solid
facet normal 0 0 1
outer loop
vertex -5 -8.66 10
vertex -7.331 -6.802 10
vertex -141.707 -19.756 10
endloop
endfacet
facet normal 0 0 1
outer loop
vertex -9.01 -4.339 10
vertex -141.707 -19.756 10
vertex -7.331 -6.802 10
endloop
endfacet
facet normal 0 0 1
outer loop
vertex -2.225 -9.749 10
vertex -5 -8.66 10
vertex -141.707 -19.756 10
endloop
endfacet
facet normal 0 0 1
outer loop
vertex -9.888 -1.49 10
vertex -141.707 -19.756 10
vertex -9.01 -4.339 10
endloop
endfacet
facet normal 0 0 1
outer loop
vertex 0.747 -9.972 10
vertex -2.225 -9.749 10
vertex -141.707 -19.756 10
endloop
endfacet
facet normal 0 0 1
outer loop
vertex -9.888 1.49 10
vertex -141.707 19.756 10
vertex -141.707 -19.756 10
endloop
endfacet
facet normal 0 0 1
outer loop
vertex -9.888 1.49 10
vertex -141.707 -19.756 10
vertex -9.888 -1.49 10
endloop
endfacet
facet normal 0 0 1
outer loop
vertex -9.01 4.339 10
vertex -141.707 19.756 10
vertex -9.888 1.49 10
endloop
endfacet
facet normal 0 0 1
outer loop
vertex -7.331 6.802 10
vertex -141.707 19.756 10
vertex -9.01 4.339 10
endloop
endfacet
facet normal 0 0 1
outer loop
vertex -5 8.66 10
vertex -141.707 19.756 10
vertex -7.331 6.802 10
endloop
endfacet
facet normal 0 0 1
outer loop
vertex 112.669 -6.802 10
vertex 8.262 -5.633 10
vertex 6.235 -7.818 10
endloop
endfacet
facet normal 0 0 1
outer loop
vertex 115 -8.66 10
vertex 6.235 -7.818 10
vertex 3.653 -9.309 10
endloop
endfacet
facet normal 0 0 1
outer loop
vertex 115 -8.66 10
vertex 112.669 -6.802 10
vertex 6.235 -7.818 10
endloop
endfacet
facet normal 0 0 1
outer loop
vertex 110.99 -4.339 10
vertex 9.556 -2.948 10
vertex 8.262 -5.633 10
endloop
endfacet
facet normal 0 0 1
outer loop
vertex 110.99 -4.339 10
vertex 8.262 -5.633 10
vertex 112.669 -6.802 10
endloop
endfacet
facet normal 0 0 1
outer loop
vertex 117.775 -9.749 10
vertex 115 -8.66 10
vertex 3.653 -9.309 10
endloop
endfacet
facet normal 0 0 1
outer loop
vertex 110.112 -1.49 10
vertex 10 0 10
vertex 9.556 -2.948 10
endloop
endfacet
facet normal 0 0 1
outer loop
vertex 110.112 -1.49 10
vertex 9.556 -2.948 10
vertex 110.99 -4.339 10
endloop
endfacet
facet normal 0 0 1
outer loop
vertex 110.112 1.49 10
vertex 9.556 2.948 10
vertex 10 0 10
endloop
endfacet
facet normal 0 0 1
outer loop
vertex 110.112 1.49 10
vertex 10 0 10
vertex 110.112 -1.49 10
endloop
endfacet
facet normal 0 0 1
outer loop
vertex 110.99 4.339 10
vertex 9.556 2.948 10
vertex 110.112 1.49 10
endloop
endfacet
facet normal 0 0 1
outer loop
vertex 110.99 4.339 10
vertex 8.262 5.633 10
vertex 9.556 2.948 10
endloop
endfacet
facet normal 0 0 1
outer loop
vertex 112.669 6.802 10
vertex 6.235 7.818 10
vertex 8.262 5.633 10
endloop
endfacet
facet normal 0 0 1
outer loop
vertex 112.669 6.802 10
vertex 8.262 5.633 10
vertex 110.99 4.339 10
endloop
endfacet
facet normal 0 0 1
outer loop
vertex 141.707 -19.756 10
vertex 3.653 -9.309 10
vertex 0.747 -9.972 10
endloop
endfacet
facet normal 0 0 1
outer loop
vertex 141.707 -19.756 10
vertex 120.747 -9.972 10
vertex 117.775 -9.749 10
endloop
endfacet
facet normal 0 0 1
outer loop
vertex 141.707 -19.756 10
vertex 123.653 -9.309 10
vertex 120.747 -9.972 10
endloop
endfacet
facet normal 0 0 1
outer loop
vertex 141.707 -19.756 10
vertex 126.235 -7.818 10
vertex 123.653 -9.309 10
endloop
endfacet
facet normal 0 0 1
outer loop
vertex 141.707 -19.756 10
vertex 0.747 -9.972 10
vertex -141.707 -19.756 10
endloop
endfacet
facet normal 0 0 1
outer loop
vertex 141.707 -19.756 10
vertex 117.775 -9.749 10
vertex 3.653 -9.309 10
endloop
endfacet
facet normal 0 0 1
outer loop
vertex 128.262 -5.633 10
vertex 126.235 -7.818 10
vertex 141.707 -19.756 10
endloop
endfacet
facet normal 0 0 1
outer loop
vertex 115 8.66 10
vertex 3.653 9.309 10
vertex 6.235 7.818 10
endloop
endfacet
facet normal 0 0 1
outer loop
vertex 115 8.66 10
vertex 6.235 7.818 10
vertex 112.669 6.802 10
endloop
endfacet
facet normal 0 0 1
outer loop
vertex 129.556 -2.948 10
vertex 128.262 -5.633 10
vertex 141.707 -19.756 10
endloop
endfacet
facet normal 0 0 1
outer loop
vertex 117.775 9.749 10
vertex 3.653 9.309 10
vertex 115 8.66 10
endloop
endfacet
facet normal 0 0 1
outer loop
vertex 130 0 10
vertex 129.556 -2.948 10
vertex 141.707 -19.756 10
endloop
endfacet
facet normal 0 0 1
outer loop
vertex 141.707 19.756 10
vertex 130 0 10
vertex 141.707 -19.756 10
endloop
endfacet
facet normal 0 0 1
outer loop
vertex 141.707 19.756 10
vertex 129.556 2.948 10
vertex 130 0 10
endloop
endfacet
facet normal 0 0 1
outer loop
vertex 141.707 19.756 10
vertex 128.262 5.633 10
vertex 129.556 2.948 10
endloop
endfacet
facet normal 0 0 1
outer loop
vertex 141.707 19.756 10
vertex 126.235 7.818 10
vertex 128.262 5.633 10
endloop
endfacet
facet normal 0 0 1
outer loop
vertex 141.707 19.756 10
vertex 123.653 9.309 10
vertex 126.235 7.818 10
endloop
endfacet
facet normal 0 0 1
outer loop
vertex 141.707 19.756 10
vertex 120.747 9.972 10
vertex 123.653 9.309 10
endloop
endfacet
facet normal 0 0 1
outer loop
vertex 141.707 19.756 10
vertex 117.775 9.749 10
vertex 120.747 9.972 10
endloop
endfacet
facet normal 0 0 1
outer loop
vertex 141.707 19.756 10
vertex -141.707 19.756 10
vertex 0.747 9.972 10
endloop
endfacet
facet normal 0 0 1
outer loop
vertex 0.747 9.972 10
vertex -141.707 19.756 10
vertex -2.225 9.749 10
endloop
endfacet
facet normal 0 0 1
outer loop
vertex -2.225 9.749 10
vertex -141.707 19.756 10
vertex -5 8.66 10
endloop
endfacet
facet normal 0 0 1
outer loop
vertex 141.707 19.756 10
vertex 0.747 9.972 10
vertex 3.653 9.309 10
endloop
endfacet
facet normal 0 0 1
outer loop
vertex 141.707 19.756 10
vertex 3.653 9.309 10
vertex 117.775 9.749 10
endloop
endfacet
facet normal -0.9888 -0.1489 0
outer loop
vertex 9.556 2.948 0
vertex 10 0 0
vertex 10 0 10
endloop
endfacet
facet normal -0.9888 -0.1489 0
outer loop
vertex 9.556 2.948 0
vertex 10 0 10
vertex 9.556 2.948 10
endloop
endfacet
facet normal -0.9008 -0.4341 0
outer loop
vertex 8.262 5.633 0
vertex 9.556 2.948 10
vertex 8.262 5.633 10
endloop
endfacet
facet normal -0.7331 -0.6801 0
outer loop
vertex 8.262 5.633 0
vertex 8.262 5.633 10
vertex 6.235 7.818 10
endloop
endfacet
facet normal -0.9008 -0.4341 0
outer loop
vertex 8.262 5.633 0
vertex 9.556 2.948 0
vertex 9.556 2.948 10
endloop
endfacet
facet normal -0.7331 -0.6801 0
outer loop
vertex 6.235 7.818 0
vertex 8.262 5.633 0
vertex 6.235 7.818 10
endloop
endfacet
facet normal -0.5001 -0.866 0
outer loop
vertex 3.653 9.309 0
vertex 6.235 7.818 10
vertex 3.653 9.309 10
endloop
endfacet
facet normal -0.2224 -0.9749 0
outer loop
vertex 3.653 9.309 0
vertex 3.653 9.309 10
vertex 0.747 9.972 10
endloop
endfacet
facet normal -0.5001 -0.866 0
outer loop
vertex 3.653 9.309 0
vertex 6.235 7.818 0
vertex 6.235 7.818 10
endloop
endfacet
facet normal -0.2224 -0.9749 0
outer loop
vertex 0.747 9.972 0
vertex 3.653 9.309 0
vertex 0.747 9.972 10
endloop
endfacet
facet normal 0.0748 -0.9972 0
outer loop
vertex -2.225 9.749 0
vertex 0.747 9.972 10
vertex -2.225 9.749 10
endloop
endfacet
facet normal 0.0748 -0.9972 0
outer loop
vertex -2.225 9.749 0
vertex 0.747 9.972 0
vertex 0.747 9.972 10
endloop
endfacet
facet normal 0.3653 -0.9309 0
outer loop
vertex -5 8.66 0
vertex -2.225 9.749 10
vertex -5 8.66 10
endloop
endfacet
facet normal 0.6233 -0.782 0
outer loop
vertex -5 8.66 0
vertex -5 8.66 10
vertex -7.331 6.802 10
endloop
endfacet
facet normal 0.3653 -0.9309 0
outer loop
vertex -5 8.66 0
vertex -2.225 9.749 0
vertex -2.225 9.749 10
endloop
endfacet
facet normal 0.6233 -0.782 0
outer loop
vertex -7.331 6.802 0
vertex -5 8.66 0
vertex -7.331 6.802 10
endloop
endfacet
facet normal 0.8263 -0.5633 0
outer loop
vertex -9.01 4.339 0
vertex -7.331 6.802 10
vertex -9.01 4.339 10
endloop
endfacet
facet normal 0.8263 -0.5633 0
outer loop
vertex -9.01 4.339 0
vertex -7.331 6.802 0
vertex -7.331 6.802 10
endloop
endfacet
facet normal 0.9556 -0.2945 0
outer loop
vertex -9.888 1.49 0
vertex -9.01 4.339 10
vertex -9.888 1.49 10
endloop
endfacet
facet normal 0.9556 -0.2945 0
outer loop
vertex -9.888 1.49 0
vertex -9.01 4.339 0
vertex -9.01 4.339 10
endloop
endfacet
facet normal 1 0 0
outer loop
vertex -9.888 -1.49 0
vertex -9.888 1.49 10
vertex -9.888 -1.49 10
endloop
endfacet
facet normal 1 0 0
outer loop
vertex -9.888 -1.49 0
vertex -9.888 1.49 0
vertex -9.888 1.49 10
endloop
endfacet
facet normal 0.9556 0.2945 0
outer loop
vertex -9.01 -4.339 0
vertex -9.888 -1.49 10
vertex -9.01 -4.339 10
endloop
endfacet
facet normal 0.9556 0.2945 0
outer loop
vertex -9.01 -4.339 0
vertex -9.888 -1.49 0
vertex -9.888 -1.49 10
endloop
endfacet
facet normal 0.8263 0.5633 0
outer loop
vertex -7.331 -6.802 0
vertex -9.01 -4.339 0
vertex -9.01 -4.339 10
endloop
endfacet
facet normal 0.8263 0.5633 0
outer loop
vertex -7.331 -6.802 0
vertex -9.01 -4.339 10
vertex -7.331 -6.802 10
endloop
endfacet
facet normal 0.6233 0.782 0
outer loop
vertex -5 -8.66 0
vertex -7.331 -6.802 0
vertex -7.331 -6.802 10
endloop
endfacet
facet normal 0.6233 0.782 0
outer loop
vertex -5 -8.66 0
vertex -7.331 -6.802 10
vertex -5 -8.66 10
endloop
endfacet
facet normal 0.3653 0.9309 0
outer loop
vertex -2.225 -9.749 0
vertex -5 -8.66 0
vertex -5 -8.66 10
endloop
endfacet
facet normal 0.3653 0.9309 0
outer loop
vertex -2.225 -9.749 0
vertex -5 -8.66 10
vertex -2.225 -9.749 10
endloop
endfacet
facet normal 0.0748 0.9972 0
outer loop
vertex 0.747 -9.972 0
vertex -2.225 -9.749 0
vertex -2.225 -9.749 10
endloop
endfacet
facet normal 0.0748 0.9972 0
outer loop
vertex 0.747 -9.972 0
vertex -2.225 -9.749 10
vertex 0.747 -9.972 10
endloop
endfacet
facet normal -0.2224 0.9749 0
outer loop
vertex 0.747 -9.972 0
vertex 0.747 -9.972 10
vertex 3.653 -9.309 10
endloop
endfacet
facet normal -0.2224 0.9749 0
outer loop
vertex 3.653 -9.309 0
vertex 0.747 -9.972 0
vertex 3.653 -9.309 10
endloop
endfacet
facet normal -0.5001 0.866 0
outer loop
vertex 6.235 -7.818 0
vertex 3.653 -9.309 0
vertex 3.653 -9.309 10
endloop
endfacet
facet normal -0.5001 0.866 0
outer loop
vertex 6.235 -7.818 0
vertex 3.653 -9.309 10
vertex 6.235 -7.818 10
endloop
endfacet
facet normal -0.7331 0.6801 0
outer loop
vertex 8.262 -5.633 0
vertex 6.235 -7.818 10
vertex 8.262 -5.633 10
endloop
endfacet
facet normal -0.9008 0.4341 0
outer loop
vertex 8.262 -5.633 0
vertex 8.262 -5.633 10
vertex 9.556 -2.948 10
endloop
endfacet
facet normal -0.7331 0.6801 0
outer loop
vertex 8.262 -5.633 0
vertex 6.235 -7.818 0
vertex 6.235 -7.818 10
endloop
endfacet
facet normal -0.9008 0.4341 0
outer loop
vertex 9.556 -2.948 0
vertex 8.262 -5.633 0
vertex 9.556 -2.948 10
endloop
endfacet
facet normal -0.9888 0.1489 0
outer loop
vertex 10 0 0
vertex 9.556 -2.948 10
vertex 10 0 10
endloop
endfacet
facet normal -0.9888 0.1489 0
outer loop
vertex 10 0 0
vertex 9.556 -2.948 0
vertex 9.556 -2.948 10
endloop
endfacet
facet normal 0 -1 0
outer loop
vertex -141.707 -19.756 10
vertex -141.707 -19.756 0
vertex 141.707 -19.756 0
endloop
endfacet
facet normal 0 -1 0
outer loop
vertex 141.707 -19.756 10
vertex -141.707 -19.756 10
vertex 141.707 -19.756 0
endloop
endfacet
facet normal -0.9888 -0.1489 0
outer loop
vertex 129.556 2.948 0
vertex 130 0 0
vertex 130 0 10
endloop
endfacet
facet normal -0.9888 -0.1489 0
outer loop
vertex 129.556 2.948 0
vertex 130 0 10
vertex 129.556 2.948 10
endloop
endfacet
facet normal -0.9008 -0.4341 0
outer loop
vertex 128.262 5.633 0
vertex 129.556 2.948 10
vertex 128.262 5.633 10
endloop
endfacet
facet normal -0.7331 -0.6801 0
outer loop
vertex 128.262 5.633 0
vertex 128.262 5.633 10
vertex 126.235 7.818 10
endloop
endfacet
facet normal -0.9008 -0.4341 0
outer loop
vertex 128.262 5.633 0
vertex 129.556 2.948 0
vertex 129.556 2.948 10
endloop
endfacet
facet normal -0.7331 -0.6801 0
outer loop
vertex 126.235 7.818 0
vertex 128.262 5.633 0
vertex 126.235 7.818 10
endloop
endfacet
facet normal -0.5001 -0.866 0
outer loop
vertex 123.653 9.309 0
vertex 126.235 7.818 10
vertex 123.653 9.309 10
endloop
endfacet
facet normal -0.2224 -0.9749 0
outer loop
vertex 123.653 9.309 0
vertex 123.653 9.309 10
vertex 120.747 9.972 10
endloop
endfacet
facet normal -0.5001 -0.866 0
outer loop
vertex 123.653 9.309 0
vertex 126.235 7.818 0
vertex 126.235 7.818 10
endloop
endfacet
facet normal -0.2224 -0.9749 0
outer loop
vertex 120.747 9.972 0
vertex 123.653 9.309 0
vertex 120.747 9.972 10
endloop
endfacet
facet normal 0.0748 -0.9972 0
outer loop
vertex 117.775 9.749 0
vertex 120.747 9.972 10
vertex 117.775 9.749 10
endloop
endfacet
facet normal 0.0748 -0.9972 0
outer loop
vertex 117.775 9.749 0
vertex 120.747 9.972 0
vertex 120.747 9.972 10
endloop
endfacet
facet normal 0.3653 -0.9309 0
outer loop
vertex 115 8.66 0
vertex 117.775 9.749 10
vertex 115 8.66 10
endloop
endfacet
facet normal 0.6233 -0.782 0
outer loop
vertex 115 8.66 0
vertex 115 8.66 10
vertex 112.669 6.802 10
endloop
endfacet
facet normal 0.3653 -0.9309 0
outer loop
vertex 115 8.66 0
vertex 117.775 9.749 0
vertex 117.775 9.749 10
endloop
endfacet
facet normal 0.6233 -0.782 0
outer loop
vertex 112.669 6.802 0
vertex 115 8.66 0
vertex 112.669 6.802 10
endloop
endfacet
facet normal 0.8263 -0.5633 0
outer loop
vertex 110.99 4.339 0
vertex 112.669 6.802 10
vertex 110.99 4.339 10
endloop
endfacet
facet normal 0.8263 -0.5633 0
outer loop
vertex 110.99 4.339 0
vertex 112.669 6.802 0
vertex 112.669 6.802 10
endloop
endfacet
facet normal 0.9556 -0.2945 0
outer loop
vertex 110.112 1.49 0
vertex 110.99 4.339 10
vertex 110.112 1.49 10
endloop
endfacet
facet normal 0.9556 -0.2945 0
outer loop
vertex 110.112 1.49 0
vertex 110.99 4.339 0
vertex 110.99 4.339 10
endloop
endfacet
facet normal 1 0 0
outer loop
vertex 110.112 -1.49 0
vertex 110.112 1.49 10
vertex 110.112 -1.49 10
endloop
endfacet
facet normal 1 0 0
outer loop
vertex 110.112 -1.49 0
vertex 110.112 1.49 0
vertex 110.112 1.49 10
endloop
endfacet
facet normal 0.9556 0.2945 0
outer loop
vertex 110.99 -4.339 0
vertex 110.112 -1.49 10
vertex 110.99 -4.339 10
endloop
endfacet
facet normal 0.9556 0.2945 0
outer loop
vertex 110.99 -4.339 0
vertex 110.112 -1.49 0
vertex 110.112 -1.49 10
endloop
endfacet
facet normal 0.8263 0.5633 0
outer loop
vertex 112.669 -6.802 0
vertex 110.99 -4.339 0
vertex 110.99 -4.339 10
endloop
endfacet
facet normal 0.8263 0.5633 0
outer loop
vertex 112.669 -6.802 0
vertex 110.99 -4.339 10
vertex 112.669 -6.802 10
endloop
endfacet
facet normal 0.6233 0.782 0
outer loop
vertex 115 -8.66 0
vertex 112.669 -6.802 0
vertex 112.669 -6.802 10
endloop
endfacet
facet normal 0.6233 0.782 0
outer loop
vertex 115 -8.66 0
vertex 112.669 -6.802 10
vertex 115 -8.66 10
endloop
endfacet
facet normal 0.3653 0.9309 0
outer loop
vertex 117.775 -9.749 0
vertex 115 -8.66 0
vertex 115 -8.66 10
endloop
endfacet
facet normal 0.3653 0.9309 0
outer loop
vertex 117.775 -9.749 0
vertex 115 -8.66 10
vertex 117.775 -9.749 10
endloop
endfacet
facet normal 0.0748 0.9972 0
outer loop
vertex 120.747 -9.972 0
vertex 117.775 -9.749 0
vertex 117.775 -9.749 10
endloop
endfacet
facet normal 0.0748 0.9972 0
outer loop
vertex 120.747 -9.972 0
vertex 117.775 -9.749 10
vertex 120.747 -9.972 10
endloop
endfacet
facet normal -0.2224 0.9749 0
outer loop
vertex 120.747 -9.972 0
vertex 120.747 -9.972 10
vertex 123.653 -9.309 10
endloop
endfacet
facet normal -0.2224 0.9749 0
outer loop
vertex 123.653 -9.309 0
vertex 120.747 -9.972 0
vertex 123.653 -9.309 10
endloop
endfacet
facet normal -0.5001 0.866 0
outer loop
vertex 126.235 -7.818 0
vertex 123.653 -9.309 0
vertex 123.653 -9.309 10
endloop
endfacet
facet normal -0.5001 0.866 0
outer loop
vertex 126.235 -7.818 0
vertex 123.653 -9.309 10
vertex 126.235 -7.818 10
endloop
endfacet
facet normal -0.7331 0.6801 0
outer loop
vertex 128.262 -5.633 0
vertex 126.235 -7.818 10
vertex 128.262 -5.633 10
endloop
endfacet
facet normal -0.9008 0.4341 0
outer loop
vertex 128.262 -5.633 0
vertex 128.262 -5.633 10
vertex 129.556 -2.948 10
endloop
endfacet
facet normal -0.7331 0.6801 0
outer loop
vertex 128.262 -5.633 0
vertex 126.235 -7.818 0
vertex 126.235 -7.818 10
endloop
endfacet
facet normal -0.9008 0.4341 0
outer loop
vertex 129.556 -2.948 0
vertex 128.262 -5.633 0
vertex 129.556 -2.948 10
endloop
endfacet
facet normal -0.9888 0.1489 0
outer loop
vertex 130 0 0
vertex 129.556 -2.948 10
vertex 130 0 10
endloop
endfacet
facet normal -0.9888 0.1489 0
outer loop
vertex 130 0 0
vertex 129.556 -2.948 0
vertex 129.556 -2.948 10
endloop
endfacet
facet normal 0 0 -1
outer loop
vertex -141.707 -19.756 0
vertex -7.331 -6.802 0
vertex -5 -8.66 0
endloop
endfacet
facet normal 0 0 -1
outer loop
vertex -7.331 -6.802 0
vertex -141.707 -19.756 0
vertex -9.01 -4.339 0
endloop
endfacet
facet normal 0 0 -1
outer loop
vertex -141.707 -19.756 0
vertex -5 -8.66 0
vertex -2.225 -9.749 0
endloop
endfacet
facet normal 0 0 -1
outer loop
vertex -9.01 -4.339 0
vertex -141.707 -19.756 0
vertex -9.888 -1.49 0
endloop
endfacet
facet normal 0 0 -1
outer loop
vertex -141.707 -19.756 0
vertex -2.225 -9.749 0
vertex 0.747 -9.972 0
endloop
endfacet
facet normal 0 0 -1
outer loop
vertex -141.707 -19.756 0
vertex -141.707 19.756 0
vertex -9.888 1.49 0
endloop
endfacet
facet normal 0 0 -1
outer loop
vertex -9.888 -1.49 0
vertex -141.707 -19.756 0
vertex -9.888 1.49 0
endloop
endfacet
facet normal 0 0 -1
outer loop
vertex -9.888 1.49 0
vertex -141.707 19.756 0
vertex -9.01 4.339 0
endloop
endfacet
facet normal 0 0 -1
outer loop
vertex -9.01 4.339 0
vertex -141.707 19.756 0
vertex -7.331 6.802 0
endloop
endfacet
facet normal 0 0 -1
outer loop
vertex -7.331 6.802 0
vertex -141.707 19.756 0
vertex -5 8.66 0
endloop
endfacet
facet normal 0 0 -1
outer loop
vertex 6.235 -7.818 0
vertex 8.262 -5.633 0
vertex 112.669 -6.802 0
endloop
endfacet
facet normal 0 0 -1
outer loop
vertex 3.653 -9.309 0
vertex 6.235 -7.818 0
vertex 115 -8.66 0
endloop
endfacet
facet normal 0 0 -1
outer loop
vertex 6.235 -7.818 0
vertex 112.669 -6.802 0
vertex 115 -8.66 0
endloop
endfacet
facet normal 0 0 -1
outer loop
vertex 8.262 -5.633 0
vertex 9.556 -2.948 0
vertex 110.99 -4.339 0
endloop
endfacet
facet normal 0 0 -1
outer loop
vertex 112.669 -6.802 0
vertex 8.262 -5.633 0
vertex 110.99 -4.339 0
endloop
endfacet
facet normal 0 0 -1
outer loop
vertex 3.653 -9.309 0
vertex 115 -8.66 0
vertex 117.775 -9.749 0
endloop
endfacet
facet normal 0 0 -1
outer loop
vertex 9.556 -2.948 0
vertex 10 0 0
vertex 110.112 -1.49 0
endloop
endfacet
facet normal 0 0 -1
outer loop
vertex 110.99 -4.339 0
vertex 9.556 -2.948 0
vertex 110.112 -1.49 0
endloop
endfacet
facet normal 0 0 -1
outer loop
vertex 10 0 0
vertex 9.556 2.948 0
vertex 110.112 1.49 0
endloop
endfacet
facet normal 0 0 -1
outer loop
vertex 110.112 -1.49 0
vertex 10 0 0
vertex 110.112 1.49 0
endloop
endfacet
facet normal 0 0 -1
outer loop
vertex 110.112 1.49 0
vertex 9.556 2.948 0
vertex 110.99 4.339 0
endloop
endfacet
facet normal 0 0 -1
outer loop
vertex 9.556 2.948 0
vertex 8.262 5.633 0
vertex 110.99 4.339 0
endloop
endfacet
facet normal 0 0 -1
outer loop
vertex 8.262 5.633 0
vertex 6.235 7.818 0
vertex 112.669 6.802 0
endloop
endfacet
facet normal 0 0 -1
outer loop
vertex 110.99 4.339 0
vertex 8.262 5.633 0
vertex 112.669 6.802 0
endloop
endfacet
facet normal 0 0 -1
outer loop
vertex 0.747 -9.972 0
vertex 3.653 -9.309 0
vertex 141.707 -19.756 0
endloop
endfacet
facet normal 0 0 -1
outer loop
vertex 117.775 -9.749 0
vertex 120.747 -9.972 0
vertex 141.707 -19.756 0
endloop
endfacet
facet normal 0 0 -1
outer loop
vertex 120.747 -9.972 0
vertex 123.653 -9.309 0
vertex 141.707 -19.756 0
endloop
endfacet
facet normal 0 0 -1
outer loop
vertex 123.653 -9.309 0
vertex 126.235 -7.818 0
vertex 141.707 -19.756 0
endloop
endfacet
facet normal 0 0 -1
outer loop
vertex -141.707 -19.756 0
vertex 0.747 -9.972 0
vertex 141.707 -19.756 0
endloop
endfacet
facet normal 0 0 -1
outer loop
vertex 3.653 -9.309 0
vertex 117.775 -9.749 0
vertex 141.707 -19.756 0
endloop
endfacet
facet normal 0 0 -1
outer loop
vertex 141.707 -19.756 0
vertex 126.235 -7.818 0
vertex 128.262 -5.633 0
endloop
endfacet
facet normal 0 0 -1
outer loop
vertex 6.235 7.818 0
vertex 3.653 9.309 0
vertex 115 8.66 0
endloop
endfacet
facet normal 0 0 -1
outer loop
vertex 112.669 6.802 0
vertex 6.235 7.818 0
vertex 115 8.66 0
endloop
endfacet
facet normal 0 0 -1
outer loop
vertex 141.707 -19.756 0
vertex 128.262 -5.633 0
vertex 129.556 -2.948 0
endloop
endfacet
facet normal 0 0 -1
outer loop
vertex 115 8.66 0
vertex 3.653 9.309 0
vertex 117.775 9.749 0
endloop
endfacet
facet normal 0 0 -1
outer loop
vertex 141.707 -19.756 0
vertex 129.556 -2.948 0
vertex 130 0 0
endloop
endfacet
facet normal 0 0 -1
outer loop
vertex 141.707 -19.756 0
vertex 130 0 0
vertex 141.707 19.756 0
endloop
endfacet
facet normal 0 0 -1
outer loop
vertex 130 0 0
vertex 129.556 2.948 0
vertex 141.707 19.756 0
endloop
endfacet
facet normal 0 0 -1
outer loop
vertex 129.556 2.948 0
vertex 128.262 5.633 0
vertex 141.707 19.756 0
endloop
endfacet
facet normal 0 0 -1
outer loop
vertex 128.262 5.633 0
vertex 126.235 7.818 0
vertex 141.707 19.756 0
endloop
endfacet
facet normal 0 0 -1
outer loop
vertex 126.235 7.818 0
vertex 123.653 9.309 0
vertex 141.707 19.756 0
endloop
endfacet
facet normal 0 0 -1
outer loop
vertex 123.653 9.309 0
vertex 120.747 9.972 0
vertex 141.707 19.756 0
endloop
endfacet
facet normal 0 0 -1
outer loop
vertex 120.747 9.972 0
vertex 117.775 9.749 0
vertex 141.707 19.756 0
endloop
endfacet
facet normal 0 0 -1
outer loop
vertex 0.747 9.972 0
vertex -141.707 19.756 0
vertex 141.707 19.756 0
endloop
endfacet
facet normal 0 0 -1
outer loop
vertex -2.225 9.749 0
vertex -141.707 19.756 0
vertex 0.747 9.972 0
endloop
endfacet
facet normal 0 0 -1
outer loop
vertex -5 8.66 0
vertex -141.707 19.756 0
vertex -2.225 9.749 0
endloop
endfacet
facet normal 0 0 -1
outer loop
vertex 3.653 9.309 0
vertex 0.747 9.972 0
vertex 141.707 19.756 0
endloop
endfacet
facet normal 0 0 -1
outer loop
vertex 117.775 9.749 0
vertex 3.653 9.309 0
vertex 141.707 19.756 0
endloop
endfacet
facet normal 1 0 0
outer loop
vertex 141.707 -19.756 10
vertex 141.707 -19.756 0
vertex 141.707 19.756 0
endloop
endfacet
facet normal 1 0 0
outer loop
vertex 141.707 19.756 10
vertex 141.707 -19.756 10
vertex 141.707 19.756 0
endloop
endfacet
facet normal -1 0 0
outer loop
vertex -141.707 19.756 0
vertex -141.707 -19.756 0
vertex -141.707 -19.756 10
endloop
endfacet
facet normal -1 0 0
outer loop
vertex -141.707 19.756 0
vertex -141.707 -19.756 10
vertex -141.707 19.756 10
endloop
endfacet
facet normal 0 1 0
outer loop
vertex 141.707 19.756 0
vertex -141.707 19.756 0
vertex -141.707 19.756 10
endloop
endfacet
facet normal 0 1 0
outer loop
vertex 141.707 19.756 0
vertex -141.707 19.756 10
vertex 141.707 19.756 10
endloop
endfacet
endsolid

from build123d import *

# Parameters (mm, degrees)
CROQUIS1_W              = 283.41300437
CROQUIS1_H              = 39.51255033
CROQUIS1_R              = 10
SALIENTE_EXTRUIR1_DEPTH = 10


with BuildPart() as part:
    # Croquis1 → Saliente-Extruir1 (new body)
    with BuildSketch(Plane.XY):
        Rectangle(CROQUIS1_W, CROQUIS1_H)
        Circle(CROQUIS1_R, mode=Mode.SUBTRACT)
        with Locations((120, 0)):
            Circle(CROQUIS1_R, mode=Mode.SUBTRACT)
    extrude(amount=SALIENTE_EXTRUIR1_DEPTH)


solid = part.part
